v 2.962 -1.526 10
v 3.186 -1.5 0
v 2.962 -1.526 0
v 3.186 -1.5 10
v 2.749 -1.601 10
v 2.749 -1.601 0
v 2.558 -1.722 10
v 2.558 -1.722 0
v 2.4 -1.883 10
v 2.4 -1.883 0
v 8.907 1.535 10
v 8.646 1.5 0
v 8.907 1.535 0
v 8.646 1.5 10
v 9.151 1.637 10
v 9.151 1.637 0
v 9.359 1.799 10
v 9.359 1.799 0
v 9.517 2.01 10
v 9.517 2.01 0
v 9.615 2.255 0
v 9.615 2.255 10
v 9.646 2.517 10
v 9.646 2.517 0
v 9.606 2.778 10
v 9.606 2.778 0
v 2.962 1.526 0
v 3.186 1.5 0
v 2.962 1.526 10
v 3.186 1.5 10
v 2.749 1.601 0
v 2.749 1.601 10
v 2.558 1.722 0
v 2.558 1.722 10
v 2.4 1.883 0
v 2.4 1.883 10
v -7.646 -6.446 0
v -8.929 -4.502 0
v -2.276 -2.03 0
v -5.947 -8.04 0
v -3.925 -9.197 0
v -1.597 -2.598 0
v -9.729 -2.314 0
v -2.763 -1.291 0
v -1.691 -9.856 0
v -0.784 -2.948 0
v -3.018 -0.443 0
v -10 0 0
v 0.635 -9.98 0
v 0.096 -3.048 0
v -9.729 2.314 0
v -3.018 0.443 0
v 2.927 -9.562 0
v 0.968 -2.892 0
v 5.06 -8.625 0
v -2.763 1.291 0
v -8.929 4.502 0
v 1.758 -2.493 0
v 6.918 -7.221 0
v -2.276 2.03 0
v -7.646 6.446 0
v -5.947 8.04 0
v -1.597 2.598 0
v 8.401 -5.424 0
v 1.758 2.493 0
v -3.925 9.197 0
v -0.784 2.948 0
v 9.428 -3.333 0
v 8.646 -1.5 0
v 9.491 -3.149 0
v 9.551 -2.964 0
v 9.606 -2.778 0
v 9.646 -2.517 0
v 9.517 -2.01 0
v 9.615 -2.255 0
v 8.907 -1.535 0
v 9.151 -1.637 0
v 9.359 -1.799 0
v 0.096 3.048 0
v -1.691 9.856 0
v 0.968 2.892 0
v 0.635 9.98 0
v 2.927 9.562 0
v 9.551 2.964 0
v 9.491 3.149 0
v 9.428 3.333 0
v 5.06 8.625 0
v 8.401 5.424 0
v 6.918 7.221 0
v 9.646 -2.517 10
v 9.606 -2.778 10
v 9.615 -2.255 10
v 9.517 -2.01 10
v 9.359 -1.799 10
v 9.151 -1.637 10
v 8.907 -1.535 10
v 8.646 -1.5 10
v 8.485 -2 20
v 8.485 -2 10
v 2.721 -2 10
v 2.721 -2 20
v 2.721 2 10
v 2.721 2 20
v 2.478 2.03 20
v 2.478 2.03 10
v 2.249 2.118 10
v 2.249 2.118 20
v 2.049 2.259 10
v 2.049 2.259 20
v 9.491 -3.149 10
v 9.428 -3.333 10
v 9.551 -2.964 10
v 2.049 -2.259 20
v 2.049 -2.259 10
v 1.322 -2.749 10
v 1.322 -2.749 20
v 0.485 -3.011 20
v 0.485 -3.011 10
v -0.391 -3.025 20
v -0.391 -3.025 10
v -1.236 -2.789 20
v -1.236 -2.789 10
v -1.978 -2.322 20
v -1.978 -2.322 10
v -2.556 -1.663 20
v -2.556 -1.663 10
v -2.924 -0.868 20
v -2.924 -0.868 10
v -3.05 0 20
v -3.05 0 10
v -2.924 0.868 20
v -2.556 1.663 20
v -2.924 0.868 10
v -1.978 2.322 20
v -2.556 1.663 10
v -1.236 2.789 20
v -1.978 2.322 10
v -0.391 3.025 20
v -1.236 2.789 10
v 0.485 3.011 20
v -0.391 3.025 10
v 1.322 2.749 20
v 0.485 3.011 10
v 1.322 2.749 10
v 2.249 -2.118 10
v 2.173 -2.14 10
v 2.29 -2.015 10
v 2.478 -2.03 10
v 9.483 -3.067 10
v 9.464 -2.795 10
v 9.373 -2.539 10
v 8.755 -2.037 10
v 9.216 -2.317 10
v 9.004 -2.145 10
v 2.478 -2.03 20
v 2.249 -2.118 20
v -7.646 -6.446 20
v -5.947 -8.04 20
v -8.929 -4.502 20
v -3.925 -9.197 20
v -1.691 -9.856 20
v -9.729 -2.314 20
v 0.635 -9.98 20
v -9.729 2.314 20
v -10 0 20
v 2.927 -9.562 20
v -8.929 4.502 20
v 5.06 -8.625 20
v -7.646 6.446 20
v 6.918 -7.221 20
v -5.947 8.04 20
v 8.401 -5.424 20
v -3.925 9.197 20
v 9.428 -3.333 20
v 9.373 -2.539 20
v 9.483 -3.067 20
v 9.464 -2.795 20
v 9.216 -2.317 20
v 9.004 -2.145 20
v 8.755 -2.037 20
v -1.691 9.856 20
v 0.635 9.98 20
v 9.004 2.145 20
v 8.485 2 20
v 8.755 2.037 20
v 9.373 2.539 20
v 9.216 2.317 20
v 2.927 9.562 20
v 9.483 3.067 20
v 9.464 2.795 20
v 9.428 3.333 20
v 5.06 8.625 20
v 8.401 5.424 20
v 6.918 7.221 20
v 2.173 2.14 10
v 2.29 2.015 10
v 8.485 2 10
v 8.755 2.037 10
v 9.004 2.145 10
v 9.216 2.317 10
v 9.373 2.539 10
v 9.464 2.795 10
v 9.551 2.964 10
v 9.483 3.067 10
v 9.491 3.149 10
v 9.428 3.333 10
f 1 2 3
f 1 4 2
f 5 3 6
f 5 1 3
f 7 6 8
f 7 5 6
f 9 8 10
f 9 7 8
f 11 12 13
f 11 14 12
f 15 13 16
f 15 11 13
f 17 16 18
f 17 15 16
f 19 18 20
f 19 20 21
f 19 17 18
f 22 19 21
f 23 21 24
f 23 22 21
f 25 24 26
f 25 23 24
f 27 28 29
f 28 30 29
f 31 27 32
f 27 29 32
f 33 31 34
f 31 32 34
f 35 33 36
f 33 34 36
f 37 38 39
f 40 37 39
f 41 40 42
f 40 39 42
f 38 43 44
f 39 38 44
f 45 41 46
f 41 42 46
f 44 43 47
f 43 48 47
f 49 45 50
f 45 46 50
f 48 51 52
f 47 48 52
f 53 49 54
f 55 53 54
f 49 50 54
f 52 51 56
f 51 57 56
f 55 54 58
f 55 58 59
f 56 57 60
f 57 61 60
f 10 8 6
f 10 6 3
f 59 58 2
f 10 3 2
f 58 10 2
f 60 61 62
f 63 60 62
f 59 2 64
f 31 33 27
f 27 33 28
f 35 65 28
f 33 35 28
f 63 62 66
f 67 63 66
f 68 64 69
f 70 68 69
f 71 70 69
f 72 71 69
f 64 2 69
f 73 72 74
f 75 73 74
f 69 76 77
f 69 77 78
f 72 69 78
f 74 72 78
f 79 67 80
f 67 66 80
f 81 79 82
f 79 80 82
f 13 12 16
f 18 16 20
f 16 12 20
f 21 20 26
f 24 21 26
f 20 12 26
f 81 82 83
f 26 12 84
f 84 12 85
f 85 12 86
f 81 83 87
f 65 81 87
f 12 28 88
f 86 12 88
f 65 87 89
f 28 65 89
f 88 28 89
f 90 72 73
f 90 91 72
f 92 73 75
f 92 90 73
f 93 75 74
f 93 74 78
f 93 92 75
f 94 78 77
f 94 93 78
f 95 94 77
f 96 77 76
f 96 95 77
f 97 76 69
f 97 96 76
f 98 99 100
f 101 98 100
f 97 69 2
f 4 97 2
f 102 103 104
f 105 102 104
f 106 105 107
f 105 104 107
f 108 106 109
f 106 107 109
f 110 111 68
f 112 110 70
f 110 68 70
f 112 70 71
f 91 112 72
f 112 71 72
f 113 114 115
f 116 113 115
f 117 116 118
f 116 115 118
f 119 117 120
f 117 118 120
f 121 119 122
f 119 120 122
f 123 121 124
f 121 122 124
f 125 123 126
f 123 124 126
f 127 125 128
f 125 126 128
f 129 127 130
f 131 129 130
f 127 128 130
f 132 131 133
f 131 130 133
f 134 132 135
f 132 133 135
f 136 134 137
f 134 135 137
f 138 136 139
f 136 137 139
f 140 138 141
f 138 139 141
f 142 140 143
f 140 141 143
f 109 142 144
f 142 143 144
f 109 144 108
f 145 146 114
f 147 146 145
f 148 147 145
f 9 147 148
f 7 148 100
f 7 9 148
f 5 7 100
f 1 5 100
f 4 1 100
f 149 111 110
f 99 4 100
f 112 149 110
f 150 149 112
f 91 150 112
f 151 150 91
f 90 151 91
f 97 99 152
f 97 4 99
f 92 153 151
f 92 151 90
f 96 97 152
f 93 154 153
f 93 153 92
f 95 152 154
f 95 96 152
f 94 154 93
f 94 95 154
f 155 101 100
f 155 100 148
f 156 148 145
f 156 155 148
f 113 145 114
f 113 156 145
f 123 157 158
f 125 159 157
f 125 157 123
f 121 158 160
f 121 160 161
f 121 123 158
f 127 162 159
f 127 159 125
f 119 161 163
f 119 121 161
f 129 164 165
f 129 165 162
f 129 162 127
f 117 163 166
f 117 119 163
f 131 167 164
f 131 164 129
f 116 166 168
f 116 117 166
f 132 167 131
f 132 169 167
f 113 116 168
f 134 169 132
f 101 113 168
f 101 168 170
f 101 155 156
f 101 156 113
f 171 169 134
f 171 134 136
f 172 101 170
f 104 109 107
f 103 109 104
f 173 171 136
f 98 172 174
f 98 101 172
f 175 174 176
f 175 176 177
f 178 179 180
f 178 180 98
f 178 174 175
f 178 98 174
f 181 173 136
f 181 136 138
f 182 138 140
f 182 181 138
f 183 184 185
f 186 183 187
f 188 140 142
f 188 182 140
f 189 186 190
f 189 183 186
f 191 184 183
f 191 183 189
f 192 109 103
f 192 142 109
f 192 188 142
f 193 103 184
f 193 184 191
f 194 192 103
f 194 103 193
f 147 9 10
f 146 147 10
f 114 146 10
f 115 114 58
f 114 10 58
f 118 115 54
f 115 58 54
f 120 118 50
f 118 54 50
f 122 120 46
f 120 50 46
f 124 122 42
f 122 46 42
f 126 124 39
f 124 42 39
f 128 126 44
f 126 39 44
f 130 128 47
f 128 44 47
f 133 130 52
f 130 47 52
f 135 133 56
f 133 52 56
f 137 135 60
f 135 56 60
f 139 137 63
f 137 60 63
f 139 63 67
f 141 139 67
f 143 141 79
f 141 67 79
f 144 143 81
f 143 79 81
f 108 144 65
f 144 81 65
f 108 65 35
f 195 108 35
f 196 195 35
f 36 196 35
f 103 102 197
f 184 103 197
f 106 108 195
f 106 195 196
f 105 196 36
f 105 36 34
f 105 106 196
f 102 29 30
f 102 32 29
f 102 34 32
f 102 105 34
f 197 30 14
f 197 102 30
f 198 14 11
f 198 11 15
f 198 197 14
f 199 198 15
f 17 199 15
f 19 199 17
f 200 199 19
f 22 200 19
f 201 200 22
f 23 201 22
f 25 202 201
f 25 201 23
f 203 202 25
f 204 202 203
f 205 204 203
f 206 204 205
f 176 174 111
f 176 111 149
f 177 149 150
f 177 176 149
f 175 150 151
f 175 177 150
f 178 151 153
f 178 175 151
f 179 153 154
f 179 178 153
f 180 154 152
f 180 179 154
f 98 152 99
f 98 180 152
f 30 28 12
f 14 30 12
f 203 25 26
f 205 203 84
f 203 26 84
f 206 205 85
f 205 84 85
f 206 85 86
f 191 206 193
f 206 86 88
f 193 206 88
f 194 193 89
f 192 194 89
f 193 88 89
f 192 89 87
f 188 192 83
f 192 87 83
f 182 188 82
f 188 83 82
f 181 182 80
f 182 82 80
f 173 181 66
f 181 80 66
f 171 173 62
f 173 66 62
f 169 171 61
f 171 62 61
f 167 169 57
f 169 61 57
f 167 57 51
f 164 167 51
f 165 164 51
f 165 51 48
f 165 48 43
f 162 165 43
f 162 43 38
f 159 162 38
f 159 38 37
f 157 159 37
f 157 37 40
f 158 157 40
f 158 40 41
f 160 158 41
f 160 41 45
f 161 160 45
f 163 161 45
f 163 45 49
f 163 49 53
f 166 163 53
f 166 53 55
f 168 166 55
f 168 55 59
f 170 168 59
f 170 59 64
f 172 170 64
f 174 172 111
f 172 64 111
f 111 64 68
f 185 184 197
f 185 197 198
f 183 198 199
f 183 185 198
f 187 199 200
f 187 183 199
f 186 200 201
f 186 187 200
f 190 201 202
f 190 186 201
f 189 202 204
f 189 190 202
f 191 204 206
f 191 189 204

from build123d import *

# Parameters (mm, degrees)
F1_DEPTH = 20
F2_R     = 1
F4_DEPTH = 10
F5_R     = 1


with BuildPart() as f1:
    # F0 (on Top) → F1 (new body)
    with BuildSketch(Plane.XY):
        with BuildLine():
            Line((2.302716, 2), (9.797959, 2))
            ThreePointArc((9.797959, 2), (-10, 0), (9.797959, -2))
            Line((9.797959, -2), (2.302716, -2))
            ThreePointArc((2.302716, -2), (-3.05, 0), (2.302716, 2))
        make_face()
    extrude(amount=F1_DEPTH)

    # F2
    f2_edges = [f1.edges().sort_by_distance(p)[0] for p in [
        (9.797959, 2, 10),
        (2.302716, 2, 10),
        (2.302716, -2, 10),
        (9.797959, -2, 10),
    ]]
    fillet(f2_edges, radius=F2_R)

    # F3 (on Top) → F4 (join)
    with BuildSketch(Plane.XY):
        with BuildLine():
            Line((2.655654, 1.5), (9.88686, 1.5))
            ThreePointArc((9.88686, 1.5), (-10, 0), (9.88686, -1.5))
            Line((9.88686, -1.5), (2.655654, -1.5))
            ThreePointArc((2.655654, -1.5), (-3.05, 0), (2.655654, 1.5))
        make_face()
    extrude(amount=F4_DEPTH)

    # F5
    f5_edges = [f1.edges().sort_by_distance(p)[0] for p in [
        (9.88686, -1.5, 5),
        (9.88686, 1.5, 5),
        (2.655654, -1.5, 5),
        (2.655654, 1.5, 5),
    ]]
    fillet(f5_edges, radius=F5_R)


solid = f1.part
